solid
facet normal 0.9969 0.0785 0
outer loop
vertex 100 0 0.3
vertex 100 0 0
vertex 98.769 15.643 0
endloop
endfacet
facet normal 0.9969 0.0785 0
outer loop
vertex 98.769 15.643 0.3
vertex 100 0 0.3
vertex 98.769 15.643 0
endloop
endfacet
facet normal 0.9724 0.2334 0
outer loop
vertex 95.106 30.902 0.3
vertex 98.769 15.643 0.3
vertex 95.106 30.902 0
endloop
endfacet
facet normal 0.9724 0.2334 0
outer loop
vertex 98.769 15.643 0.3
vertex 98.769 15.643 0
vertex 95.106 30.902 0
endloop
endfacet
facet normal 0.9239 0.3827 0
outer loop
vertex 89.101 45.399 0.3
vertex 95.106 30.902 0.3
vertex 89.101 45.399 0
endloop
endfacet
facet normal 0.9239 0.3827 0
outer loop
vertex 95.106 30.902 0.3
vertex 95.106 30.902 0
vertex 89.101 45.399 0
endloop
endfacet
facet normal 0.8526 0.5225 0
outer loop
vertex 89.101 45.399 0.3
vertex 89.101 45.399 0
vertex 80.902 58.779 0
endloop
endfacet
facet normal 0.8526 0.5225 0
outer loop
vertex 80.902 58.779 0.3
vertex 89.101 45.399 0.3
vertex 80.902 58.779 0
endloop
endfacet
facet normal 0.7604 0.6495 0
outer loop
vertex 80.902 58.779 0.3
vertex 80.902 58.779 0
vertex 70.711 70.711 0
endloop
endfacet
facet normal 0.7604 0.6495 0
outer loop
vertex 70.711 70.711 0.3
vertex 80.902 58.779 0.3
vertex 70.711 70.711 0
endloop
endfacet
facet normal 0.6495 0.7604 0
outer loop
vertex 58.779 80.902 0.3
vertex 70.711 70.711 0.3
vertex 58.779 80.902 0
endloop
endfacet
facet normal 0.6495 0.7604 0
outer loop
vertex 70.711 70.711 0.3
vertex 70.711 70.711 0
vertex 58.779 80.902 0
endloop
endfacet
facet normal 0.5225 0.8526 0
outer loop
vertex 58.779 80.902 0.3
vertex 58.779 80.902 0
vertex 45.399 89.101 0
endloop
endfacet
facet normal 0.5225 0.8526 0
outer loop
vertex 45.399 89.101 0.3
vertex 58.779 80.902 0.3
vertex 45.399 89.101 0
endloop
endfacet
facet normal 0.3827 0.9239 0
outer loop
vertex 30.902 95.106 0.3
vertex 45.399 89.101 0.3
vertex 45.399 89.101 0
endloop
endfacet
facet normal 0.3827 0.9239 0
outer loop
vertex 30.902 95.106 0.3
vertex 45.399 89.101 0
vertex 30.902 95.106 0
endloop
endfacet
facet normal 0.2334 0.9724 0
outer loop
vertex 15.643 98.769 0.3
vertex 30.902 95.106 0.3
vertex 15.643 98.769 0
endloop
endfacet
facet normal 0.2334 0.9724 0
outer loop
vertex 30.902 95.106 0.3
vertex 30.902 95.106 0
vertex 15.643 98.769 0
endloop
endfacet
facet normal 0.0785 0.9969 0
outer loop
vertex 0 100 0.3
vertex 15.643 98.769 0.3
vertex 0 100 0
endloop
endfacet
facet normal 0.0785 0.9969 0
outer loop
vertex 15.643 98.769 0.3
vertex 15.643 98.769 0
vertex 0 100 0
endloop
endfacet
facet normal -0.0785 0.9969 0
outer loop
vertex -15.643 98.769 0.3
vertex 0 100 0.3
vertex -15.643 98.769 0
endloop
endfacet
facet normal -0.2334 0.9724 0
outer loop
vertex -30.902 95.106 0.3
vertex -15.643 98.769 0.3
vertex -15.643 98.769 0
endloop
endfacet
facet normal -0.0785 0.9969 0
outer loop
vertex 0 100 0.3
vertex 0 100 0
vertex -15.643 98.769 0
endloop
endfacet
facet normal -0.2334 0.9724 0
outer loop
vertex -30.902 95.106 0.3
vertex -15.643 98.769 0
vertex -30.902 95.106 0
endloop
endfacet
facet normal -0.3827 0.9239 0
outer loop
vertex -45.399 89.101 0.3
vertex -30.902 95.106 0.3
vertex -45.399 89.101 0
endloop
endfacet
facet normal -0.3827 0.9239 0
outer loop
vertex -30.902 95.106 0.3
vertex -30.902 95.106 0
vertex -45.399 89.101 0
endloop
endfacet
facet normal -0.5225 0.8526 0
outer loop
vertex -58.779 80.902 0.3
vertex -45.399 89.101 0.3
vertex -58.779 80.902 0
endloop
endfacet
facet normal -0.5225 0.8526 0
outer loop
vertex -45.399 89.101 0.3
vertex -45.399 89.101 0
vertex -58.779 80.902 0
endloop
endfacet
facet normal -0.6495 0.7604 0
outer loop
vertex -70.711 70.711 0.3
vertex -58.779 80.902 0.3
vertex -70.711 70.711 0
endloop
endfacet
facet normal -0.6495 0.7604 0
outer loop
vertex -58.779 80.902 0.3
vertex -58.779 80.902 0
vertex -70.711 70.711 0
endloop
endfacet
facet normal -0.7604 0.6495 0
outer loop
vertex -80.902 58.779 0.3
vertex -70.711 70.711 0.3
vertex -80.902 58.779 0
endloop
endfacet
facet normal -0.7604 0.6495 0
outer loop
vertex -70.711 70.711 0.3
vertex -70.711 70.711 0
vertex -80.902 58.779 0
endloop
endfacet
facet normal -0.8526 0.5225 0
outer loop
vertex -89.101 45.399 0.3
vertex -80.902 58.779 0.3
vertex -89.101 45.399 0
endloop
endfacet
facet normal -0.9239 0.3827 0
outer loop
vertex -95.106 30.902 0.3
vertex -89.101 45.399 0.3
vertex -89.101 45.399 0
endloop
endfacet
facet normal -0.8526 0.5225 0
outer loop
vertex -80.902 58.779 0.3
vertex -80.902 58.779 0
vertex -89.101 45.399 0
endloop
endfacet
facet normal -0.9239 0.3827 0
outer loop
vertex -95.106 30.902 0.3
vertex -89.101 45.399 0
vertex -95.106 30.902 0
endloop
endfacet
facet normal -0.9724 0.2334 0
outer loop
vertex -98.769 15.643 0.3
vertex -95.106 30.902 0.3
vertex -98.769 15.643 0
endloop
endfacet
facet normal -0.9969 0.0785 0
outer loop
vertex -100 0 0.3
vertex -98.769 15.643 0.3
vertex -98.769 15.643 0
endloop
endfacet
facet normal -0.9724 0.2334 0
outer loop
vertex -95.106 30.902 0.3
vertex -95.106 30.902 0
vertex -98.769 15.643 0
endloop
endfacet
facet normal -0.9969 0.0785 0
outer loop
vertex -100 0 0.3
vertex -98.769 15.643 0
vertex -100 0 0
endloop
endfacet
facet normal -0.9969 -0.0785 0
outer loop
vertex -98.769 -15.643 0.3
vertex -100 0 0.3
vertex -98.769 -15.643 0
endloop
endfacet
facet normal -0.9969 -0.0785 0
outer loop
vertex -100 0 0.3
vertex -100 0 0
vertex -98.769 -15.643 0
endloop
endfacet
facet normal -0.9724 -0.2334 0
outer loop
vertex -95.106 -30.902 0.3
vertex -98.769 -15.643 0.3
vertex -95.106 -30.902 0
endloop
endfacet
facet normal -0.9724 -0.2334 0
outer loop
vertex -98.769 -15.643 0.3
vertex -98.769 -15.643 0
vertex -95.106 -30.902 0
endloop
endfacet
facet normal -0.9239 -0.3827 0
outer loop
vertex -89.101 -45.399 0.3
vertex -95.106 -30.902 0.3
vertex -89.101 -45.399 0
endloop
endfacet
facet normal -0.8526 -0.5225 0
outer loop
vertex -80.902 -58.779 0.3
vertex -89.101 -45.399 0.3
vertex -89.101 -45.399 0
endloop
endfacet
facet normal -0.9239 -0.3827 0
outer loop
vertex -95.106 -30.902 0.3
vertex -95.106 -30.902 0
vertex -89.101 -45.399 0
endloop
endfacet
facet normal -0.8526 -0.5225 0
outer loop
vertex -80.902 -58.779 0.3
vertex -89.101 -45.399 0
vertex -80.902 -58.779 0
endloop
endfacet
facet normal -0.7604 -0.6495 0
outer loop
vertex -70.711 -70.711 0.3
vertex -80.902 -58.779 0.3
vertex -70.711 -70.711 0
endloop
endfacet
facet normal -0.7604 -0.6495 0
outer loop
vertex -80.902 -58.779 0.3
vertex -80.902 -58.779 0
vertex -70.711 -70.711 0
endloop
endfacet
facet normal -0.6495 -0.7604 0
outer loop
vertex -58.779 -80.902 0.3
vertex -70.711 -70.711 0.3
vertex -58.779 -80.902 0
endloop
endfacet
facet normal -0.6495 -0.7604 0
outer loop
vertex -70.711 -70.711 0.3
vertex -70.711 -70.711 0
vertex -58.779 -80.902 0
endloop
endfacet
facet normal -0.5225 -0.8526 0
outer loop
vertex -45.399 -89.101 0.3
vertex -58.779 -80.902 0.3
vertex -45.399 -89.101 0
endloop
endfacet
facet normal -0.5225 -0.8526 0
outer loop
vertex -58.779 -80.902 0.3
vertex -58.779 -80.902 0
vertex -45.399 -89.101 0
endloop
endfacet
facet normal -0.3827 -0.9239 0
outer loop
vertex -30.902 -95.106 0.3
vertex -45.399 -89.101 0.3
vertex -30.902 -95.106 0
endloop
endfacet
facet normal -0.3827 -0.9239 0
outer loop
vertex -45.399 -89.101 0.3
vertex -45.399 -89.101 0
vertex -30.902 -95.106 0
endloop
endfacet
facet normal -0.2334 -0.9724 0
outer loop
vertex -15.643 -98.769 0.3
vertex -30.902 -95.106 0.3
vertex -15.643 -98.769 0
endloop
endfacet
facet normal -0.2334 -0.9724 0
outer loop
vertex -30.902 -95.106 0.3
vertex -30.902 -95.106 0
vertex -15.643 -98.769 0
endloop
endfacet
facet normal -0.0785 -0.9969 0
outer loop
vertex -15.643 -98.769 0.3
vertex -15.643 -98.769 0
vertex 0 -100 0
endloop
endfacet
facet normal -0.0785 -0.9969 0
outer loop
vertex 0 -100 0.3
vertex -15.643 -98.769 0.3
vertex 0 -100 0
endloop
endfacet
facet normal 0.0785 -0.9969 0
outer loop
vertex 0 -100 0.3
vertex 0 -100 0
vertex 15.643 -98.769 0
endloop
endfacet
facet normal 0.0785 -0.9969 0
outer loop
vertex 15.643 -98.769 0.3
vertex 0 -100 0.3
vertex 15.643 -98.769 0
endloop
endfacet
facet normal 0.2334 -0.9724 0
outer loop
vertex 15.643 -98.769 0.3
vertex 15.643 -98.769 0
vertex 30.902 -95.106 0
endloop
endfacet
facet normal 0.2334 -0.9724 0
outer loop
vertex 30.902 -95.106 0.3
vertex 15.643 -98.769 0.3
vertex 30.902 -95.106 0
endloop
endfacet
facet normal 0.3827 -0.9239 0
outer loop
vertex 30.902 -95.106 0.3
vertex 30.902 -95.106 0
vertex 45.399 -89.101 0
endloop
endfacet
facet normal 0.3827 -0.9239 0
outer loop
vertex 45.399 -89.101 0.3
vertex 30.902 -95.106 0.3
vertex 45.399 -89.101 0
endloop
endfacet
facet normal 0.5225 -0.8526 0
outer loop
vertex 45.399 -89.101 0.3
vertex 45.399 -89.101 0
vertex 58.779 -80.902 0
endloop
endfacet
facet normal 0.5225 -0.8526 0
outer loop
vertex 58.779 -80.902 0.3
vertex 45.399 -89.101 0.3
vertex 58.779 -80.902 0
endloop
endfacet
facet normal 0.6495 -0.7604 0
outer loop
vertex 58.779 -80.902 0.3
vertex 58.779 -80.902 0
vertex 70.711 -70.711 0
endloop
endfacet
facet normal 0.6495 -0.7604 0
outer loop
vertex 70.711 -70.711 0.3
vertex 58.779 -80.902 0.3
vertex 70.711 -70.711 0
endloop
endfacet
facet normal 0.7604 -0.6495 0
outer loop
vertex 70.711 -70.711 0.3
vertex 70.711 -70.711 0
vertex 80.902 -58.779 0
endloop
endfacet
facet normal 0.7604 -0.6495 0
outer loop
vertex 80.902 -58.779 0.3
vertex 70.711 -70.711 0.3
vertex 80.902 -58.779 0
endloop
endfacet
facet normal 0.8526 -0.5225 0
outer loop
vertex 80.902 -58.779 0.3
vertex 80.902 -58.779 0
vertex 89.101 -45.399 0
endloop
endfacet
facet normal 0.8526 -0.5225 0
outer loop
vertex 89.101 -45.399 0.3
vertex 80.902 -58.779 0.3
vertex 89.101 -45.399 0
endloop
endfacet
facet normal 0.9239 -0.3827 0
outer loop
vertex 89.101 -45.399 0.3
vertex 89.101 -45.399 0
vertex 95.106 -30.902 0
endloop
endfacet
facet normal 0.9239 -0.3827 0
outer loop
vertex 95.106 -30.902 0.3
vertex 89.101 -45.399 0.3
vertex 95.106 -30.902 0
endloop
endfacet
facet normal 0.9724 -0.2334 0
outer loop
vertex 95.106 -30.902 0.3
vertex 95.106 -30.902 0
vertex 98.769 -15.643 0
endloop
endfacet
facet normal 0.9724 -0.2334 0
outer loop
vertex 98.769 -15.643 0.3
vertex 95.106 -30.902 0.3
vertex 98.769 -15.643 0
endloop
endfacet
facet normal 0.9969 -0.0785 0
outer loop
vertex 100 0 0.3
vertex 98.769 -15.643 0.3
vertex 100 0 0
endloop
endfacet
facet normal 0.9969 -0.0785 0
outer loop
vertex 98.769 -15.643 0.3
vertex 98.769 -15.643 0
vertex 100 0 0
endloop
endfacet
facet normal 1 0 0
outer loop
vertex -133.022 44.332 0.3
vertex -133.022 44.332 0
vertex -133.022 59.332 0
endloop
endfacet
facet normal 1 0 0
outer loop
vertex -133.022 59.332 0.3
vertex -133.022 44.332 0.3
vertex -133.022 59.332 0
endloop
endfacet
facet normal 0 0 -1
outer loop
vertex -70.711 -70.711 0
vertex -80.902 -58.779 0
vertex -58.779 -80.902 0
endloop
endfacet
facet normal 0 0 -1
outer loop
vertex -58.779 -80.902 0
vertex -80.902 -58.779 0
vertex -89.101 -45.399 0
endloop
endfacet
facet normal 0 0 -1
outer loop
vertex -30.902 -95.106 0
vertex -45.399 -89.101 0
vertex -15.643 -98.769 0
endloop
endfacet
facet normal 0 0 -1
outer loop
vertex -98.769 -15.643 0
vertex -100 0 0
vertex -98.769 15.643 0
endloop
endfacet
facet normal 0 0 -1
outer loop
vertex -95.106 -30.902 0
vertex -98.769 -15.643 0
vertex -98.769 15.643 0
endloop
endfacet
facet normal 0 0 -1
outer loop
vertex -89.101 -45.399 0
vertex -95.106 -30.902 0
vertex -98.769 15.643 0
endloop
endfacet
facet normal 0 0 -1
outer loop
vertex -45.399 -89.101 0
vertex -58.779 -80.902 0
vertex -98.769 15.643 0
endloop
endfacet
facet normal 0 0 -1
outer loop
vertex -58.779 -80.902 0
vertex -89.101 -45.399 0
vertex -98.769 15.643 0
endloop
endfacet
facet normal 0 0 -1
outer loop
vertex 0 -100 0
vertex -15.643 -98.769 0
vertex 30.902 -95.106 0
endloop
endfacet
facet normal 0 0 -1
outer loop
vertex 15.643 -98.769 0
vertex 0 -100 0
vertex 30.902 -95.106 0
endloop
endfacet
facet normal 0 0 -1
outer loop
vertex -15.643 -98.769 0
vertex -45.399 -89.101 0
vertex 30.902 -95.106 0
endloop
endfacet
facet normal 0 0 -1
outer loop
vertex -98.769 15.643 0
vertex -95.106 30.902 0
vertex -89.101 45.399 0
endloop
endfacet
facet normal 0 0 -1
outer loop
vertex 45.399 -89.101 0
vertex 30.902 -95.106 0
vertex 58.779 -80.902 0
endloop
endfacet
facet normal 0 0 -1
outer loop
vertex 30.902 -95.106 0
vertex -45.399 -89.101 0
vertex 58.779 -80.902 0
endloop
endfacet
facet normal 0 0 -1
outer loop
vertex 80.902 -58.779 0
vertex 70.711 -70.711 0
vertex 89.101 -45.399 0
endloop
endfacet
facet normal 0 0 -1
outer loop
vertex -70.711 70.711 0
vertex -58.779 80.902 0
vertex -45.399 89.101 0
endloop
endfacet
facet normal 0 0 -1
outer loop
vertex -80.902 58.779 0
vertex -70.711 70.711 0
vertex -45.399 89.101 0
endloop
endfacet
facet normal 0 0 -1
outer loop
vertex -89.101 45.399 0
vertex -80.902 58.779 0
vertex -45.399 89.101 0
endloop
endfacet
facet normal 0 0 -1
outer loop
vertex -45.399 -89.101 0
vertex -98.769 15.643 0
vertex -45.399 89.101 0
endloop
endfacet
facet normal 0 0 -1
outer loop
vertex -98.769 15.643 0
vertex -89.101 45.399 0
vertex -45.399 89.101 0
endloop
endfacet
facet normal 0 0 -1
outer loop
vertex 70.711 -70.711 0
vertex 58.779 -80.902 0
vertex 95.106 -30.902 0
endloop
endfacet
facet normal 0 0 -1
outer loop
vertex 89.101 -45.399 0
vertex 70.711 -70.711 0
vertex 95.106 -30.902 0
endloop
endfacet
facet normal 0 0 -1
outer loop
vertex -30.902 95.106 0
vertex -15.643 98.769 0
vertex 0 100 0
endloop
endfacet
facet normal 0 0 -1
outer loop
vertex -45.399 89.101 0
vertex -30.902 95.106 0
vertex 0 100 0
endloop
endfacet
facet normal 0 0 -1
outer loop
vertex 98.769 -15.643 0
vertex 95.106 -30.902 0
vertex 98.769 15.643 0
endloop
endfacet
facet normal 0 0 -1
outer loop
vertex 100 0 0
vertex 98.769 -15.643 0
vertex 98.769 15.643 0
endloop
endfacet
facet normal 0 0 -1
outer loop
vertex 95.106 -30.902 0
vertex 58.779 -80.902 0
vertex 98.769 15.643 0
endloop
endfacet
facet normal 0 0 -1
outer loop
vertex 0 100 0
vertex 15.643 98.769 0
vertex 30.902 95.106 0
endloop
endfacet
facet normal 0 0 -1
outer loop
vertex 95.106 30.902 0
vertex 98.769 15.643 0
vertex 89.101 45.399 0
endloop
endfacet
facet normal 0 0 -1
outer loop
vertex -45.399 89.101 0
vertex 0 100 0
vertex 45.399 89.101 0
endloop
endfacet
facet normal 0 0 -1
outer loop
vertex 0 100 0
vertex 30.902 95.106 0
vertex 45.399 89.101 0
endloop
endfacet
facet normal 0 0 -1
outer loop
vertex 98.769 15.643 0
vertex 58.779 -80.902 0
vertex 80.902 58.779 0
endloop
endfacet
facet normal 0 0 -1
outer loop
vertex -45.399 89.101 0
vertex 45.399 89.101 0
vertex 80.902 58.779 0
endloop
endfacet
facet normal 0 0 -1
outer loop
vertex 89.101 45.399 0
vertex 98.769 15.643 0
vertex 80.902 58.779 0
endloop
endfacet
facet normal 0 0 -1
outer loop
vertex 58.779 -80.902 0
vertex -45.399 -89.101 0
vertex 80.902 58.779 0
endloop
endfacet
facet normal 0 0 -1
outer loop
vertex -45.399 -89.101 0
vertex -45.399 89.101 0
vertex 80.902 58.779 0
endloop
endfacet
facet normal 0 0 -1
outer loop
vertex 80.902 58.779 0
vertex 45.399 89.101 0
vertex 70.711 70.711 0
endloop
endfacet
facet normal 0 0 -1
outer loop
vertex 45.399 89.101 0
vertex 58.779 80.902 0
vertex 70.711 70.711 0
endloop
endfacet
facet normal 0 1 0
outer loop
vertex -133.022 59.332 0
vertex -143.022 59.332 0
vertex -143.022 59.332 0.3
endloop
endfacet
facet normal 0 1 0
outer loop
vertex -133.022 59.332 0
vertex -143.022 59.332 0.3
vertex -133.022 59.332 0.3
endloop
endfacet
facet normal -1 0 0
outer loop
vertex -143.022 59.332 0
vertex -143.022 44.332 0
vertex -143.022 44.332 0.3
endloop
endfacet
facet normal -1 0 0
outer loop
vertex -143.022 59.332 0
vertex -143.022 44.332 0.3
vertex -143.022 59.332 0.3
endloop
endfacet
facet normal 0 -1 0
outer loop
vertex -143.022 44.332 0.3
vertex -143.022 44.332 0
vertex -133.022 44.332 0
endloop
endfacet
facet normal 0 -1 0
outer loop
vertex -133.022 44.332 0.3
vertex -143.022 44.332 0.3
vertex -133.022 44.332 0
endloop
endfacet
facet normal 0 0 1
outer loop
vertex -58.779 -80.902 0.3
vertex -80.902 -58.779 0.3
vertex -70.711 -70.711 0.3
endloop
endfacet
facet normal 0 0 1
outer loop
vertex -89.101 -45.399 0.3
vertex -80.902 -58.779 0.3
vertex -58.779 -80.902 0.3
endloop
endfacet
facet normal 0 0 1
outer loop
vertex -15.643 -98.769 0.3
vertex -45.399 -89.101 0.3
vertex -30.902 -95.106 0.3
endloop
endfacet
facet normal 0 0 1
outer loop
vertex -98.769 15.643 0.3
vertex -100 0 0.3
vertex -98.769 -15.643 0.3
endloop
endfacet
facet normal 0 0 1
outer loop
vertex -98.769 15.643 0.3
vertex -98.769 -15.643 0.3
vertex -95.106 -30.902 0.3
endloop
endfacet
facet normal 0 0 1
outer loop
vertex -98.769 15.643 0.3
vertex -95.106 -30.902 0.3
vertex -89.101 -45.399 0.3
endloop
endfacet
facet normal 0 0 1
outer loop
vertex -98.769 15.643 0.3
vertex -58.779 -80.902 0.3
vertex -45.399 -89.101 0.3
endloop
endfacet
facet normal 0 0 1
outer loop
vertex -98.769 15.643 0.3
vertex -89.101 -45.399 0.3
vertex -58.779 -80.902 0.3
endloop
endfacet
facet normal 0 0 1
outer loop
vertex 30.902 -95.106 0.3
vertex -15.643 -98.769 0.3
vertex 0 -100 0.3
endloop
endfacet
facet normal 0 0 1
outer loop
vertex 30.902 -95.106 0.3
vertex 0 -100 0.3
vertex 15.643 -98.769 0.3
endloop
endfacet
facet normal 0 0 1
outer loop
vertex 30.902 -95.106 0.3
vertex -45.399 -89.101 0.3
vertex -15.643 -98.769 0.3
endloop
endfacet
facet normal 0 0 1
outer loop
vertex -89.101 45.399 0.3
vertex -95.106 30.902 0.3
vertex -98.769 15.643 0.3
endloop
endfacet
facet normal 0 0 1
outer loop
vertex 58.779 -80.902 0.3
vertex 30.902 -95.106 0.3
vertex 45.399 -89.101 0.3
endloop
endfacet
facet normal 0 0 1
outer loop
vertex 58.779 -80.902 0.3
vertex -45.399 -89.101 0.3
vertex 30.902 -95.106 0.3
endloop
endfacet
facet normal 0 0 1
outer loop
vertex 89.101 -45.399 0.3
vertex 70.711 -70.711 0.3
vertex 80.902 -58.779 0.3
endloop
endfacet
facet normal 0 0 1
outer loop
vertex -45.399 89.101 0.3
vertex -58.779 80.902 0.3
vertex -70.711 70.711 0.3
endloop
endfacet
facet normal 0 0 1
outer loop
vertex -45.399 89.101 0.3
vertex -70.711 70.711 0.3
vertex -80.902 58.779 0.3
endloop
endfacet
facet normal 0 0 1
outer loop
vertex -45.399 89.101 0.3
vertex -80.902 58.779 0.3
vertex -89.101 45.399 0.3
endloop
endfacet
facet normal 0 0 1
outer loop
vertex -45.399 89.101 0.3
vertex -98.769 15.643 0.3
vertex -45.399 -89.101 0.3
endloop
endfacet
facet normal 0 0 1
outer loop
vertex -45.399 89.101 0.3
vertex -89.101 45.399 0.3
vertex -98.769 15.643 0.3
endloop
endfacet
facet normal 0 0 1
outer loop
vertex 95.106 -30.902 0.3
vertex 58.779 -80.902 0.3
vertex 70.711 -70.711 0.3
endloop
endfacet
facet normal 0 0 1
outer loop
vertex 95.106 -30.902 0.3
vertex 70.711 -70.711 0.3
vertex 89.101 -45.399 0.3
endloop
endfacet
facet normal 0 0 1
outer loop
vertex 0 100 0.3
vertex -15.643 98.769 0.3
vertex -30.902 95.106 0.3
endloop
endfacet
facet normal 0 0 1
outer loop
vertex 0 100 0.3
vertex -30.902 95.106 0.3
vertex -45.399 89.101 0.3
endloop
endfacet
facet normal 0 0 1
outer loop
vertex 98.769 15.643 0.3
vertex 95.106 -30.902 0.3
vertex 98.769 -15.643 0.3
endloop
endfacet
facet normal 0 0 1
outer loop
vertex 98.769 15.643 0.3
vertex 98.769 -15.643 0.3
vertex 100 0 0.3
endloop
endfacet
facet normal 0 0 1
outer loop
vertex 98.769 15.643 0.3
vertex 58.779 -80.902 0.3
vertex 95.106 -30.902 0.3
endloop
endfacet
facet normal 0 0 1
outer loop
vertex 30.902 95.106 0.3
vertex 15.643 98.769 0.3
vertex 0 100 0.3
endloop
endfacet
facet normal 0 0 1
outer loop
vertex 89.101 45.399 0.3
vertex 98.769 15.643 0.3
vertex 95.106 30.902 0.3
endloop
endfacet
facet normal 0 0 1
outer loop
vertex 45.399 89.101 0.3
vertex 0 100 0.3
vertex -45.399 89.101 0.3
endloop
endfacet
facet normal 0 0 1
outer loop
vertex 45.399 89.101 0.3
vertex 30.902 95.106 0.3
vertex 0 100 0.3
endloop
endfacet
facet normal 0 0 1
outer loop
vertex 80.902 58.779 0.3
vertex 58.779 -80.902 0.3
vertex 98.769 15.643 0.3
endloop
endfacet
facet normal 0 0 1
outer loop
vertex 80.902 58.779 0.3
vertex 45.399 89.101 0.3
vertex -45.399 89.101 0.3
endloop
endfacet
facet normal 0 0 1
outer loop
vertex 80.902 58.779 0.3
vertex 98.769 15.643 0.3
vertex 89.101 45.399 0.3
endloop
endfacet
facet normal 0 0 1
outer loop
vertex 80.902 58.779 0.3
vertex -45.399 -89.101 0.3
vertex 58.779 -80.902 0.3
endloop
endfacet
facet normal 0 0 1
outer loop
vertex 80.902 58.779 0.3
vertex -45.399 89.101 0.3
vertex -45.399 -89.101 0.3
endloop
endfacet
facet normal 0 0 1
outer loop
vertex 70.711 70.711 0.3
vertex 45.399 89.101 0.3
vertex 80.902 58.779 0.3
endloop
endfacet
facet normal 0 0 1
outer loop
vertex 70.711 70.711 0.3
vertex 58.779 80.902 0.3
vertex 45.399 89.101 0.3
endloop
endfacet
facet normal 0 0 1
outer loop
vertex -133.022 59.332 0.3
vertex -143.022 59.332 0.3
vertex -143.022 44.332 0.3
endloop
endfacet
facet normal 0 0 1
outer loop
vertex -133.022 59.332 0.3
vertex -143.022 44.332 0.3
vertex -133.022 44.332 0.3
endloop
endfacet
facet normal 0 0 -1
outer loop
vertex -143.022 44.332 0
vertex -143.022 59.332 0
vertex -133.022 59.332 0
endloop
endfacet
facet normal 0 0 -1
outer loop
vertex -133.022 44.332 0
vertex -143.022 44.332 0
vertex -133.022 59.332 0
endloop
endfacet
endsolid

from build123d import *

# Parameters (mm, degrees)
F0_R     = 100
F0_W     = 10
F0_H     = 15
F1_DEPTH = 0.3


with BuildPart() as f1:
    # F0 (on Top) → F1 (new body)
    with BuildSketch(Plane.XY):
        Circle(F0_R)
        with Locations((-138.022373, 51.831916)):
            Rectangle(F0_W, F0_H)
    extrude(amount=F1_DEPTH)


solid = f1.part
